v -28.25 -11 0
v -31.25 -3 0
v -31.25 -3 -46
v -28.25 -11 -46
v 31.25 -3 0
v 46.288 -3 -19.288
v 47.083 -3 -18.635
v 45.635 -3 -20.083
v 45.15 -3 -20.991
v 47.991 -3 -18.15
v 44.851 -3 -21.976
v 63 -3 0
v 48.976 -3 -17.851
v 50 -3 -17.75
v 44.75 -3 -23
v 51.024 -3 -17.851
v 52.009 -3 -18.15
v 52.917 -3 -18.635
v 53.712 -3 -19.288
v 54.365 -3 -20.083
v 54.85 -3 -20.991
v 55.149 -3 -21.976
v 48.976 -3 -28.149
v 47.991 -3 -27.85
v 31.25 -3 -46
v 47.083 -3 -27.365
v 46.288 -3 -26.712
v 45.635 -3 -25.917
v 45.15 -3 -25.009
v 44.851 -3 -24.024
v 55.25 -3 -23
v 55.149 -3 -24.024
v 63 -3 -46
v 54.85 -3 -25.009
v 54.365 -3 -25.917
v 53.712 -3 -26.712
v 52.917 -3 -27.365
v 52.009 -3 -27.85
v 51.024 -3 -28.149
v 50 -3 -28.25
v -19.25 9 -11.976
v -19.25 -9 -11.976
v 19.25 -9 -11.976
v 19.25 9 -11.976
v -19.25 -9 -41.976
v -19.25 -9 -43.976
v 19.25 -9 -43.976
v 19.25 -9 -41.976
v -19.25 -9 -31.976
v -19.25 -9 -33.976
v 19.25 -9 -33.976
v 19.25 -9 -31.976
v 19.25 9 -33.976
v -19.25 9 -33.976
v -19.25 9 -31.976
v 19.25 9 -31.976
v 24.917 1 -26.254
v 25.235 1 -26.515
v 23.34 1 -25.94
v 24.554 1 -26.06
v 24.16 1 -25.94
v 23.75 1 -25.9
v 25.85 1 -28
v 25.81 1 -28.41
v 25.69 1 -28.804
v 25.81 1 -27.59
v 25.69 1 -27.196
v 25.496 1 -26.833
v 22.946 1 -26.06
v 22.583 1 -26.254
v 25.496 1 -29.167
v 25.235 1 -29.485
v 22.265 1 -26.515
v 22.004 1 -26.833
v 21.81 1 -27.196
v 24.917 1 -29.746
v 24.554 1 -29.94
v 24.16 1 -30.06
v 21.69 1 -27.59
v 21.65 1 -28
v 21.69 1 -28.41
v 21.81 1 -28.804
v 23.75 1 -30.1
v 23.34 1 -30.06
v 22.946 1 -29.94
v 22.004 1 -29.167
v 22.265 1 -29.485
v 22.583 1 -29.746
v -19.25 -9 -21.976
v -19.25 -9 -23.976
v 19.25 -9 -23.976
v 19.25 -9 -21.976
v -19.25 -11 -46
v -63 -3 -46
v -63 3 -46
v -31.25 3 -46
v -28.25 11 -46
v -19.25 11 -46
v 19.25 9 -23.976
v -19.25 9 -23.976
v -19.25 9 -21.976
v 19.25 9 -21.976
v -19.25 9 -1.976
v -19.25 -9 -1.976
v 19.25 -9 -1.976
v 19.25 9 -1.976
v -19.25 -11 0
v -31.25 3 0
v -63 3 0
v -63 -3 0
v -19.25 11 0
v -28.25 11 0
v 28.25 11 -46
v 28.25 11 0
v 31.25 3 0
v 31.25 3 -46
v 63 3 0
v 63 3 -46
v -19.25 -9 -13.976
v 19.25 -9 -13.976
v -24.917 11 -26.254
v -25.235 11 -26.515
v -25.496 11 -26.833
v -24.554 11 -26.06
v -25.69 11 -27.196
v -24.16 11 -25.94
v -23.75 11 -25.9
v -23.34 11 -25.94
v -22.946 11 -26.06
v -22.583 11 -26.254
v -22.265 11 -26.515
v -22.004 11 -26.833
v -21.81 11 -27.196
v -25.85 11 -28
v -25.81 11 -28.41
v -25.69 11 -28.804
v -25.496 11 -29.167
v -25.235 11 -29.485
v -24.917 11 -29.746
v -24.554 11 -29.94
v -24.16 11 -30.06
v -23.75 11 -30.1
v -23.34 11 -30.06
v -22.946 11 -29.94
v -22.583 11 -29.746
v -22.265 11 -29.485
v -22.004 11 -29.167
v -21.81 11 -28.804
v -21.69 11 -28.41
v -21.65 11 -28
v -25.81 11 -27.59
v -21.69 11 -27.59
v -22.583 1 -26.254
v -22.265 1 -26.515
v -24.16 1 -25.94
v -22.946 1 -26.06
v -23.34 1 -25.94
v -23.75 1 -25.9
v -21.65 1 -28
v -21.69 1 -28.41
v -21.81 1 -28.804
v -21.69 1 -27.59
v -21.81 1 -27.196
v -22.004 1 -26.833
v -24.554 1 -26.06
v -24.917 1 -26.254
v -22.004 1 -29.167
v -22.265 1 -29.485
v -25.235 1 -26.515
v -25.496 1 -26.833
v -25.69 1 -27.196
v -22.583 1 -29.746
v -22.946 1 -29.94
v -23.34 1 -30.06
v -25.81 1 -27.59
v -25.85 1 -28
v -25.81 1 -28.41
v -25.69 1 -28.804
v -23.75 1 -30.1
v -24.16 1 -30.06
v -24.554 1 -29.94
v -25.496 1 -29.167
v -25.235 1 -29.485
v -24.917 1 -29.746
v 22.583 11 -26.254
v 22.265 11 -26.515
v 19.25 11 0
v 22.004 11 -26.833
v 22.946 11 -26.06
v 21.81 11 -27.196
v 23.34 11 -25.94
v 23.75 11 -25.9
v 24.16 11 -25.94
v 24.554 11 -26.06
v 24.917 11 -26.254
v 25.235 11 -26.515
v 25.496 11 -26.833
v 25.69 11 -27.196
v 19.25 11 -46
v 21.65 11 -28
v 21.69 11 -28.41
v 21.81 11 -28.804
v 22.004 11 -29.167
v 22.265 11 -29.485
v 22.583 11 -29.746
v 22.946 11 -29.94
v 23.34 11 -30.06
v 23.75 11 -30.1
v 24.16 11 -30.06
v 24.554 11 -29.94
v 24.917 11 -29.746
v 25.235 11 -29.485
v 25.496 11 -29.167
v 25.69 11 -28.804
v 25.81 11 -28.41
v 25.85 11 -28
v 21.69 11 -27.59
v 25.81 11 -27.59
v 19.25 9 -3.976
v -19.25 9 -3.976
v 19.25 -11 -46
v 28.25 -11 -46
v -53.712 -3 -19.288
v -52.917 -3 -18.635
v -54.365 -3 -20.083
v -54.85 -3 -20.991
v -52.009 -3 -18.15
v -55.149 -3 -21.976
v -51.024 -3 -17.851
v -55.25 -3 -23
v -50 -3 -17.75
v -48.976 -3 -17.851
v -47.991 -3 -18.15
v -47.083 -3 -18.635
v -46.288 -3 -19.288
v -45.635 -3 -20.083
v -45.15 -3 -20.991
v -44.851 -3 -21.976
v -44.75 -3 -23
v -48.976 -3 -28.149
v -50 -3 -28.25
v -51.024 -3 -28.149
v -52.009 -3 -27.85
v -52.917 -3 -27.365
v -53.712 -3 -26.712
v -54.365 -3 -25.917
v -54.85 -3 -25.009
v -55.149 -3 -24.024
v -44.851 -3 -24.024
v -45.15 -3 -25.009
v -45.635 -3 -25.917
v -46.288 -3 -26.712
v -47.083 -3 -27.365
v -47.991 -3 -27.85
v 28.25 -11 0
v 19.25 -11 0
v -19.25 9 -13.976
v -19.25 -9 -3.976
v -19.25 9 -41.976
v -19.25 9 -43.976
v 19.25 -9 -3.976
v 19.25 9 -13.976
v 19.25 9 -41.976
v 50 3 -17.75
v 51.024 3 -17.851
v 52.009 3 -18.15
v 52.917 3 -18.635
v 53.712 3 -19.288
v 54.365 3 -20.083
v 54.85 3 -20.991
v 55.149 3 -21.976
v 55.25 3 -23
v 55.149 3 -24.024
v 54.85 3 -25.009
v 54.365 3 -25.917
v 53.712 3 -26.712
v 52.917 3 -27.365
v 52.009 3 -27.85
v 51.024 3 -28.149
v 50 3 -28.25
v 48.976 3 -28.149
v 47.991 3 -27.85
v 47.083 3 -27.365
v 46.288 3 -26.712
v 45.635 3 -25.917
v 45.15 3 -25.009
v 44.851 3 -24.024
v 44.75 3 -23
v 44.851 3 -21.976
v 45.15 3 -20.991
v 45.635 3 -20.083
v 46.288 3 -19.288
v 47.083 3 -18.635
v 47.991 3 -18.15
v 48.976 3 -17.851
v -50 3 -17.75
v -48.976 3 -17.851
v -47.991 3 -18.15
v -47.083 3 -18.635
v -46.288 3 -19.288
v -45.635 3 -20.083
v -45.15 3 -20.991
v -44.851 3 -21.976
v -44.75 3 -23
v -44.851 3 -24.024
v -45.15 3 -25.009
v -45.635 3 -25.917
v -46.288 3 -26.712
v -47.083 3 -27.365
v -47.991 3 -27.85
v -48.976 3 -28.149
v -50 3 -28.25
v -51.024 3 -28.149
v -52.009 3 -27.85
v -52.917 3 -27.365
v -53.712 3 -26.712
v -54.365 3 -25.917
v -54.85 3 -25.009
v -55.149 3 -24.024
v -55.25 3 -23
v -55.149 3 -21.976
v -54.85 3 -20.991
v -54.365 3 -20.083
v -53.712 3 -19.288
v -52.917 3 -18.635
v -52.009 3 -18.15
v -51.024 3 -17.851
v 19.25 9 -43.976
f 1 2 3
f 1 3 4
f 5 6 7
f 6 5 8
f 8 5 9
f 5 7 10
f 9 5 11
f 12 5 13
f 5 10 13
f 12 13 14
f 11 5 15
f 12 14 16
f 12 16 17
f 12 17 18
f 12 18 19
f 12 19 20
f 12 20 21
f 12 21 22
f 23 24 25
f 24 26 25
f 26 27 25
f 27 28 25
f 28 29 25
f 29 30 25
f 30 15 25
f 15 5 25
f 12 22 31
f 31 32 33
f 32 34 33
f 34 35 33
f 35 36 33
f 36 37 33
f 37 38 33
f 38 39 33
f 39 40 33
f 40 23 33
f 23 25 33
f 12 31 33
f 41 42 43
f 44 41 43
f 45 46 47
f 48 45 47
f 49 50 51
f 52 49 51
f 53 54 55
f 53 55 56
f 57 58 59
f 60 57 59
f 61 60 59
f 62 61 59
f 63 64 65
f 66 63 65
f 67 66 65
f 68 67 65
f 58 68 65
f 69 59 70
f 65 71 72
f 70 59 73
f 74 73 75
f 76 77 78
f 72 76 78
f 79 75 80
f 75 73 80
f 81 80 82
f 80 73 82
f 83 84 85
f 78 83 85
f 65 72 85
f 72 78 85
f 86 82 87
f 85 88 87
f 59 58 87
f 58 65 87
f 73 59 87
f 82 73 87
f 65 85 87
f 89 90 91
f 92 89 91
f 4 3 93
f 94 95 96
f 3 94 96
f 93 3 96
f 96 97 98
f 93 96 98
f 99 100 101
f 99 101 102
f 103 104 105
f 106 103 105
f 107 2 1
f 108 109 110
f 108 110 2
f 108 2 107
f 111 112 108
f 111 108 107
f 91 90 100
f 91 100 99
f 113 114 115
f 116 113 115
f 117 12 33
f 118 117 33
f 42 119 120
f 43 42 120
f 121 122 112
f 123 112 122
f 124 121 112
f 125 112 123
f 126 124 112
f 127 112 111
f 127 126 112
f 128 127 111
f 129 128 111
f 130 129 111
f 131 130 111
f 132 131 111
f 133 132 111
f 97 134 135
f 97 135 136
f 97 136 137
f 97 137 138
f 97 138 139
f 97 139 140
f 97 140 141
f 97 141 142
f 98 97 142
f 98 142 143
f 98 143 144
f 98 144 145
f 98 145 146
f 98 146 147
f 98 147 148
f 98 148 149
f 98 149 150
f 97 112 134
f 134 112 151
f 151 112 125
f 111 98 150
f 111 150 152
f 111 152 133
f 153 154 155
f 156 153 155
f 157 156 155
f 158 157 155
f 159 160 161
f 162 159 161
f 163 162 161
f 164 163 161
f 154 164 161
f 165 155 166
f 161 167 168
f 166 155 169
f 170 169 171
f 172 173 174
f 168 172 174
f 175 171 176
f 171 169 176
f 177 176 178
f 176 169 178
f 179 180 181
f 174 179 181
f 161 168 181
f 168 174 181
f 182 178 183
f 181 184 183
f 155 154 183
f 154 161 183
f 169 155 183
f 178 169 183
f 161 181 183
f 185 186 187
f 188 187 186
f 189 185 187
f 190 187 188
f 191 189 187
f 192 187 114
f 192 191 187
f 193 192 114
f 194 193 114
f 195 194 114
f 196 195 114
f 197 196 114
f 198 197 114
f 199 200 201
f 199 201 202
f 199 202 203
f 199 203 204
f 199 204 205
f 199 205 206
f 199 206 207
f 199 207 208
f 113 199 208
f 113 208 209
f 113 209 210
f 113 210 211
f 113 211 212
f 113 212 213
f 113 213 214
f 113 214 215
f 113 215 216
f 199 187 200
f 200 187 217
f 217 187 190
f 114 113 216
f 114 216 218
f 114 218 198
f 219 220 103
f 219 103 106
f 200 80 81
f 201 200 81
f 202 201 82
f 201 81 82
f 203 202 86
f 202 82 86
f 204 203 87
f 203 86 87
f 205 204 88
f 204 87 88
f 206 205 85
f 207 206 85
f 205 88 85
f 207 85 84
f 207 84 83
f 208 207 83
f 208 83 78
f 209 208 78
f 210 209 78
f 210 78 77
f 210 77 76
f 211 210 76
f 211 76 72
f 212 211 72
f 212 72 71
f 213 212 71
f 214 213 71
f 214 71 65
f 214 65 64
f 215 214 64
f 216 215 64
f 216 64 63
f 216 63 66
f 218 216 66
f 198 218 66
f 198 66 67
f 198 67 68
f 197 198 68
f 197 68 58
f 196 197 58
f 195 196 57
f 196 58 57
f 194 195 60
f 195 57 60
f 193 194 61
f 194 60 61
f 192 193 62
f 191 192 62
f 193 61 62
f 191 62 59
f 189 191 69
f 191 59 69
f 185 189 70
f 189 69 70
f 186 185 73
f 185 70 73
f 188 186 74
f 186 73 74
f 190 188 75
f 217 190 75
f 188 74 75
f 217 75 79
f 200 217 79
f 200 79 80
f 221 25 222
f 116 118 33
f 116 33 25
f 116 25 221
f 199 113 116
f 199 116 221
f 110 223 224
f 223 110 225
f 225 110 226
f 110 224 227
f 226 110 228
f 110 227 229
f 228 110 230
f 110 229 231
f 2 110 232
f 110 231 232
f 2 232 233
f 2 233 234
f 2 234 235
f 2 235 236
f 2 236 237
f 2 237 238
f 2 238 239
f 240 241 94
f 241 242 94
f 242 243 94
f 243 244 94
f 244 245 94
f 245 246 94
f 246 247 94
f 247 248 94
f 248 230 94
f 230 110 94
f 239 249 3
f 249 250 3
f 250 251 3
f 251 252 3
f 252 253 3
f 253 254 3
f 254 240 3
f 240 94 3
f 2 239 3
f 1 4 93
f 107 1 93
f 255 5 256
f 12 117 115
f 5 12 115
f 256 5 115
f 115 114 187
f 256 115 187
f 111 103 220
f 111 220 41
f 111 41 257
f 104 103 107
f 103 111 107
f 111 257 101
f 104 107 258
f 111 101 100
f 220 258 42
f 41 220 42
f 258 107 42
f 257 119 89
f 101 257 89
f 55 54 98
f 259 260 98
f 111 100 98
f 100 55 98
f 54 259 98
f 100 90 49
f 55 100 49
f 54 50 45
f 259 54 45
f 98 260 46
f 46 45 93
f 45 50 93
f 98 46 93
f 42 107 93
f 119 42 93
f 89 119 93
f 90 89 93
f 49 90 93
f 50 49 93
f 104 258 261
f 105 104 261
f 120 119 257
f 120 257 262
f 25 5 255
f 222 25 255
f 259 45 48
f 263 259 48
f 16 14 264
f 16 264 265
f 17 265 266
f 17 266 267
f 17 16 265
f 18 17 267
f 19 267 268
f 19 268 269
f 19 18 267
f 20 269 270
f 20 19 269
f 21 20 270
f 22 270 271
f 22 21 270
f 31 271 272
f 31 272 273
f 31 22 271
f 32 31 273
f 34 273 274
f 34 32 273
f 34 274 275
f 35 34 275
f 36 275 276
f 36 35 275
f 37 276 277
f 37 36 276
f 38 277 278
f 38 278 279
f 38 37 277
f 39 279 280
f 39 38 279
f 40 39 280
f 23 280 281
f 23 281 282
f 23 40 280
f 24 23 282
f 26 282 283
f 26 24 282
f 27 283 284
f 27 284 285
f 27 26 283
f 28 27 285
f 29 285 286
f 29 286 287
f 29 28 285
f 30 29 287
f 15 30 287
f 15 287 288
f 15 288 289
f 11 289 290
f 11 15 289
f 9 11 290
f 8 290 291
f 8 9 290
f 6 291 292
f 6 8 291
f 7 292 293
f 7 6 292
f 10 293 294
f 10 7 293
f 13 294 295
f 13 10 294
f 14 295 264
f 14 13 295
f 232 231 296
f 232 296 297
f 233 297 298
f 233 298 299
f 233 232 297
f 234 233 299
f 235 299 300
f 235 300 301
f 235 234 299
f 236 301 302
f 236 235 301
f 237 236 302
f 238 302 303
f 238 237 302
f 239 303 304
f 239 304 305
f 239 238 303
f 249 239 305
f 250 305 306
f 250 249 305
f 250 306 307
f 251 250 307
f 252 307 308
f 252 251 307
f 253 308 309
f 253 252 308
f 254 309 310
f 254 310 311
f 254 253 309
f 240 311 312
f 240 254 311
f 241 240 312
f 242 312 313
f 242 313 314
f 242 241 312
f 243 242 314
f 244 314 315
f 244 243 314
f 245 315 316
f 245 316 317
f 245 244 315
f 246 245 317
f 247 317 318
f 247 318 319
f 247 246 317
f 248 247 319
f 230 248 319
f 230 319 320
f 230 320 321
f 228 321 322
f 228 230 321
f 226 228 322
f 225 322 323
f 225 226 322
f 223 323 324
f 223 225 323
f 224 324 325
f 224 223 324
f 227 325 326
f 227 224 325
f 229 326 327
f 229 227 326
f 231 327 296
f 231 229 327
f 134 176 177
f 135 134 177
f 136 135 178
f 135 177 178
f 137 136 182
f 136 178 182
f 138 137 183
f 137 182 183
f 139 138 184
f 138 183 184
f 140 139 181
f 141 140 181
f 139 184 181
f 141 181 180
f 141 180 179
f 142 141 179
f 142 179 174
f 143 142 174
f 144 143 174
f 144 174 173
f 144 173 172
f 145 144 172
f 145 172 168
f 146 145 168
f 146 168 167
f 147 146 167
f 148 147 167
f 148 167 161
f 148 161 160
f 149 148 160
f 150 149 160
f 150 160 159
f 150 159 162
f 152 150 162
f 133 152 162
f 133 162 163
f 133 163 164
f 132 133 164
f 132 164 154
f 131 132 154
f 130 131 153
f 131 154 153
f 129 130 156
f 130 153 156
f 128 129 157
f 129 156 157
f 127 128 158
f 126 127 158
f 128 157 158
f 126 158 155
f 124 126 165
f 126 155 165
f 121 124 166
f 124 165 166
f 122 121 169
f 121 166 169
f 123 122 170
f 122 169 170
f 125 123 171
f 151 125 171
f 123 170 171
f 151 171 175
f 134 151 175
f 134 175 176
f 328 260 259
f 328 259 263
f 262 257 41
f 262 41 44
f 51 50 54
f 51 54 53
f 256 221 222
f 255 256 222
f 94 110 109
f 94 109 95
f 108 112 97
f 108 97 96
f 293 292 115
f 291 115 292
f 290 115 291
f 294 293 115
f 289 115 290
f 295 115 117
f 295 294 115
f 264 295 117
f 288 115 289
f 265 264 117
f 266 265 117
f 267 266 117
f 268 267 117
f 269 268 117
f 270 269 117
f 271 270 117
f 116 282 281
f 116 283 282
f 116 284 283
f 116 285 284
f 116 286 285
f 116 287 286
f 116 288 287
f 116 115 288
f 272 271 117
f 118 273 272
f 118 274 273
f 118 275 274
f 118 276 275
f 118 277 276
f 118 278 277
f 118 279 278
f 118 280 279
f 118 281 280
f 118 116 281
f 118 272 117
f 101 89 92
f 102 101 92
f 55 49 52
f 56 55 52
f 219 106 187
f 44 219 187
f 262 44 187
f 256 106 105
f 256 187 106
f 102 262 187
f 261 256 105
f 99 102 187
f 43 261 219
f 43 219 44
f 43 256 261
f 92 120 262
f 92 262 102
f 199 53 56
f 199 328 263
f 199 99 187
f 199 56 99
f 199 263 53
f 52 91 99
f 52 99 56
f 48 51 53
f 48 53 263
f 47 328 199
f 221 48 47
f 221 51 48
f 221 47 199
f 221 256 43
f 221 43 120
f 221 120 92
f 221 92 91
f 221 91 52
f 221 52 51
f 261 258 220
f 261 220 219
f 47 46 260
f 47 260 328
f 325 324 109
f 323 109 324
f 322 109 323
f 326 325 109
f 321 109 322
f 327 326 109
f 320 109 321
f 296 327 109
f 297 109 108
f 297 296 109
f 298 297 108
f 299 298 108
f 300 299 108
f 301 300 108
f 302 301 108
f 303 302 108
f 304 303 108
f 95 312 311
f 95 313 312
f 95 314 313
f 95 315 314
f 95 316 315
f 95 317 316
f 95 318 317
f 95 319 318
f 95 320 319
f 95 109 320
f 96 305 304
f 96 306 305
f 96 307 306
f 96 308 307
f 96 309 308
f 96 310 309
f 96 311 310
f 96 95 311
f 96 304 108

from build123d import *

# Parameters (mm, degrees)
BOSS_EXTRUDE1_DEPTH        = 3
BOSS_EXTRUDE1_DEPTH_BACK   = 3
SKETCH1_W                  = 31.75
SKETCH1_H                  = 46
SKETCH1_R                  = 5.25
BOSS_EXTRUDE1_2_DEPTH      = 3
BOSS_EXTRUDE1_2_DEPTH_BACK = 3
BOSS_EXTRUDE2_DEPTH        = 11
BOSS_EXTRUDE2_DEPTH_BACK   = 11
SKETCH2_W                  = 9
SKETCH2_H                  = 46
BOSS_EXTRUDE2_2_DEPTH      = 11
BOSS_EXTRUDE2_2_DEPTH_BACK = 11
BOSS_EXTRUDE3_DEPTH        = 46
M5X0_8_TAPPED_HOLE1_D      = 4.2
M5X0_8_TAPPED_HOLE1_DEPTH  = 10
BOSS_EXTRUDE4_DEPTH        = 9
BOSS_EXTRUDE4_DEPTH_BACK   = 9
SKETCH6_W                  = 38.5
SKETCH6_H                  = 2


with BuildPart() as part:
    # Sketch1 → Boss-Extrude1 (new, two sides: drawn at the far end of the back side and taken through both)
    with BuildSketch(Plane(origin=(0, 0, 0), x_dir=(1, 0, 0), z_dir=(0, 1, 0)).offset(-BOSS_EXTRUDE1_DEPTH_BACK)):
        with Locations((-47.125, 23)):
            Rectangle(SKETCH1_W, SKETCH1_H)
        with Locations(Location((-50, 23, 0), (0, 0, 270))):
            Circle(SKETCH1_R, mode=Mode.SUBTRACT)
    extrude(amount=BOSS_EXTRUDE1_DEPTH + BOSS_EXTRUDE1_DEPTH_BACK)



with BuildPart() as body_2:
    # Sketch1 → Boss-Extrude1 2 (new, two sides: drawn at the far end of the back side and taken through both)
    with BuildSketch(Plane(origin=(0, 0, 0), x_dir=(1, 0, 0), z_dir=(0, 1, 0)).offset(-BOSS_EXTRUDE1_2_DEPTH_BACK)):
        with Locations((47.125, 23)):
            Rectangle(SKETCH1_W, SKETCH1_H)
        with Locations(Location((50, 23, 0), (0, 0, 270))):
            Circle(SKETCH1_R, mode=Mode.SUBTRACT)
    extrude(amount=BOSS_EXTRUDE1_2_DEPTH + BOSS_EXTRUDE1_2_DEPTH_BACK)


with BuildPart() as body_3:
    # Sketch2 → Boss-Extrude2 (new, two sides: drawn at the far end of the back side and taken through both)
    with BuildSketch(Plane(origin=(0, 0, 0), x_dir=(1, 0, 0), z_dir=(0, 1, 0)).offset(-BOSS_EXTRUDE2_DEPTH_BACK)):
        with Locations((23.75, 23)):
            Rectangle(SKETCH2_W, SKETCH2_H)
    extrude(amount=BOSS_EXTRUDE2_DEPTH + BOSS_EXTRUDE2_DEPTH_BACK)


with BuildPart() as body_4:
    # Sketch2 → Boss-Extrude2 2 (new, two sides: drawn at the far end of the back side and taken through both)
    with BuildSketch(Plane(origin=(0, 0, 0), x_dir=(1, 0, 0), z_dir=(0, 1, 0)).offset(-BOSS_EXTRUDE2_2_DEPTH_BACK)):
        with Locations((-23.75, 23)):
            Rectangle(SKETCH2_W, SKETCH2_H)
    extrude(amount=BOSS_EXTRUDE2_2_DEPTH + BOSS_EXTRUDE2_2_DEPTH_BACK)


with BuildPart() as part_1:
    add(part.part)

    add(body_2.part)  # Boss-Extrude3 merges body 2

    add(body_3.part)  # Boss-Extrude3 merges body 3

    add(body_4.part)  # Boss-Extrude3 merges body 4
    # Sketch3 → Boss-Extrude3 (add, through all)
    with BuildSketch(Plane.XY):
        Polygon((28.25, 11), (31.25, 3), (31.25, -3), (28.25, -11), align=None)
        Polygon((-31.25, 3), (-31.25, -3), (-28.25, -11), (-28.25, 11), align=None)
    extrude(amount=-BOSS_EXTRUDE3_DEPTH)

    # M5x0.8 Tapped Hole1
    with Locations(Plane(origin=(0, 11, 0), x_dir=(1, 0, 0), z_dir=(0, 1, 0))):
        with Locations((-23.75, 28), (23.75, 28)):
            Hole(M5X0_8_TAPPED_HOLE1_D / 2, depth=M5X0_8_TAPPED_HOLE1_DEPTH)

    # Sketch6 → Boss-Extrude4 (add, two sides: drawn at the far end of the back side and taken through both)
    with BuildSketch(Plane(origin=(0, 0, 0), x_dir=(1, 0, 0), z_dir=(0, 1, 0)).offset(-BOSS_EXTRUDE4_DEPTH_BACK)):
        with Locations((0, 2.975890667)):
            Rectangle(SKETCH6_W, SKETCH6_H)
        with Locations((0, 12.975890667)):
            Rectangle(SKETCH6_W, SKETCH6_H)
        with Locations((0, 22.975890667)):
            Rectangle(SKETCH6_W, SKETCH6_H)
        with Locations((0, 32.975890667)):
            Rectangle(SKETCH6_W, SKETCH6_H)
        with Locations((0, 42.975890667)):
            Rectangle(SKETCH6_W, SKETCH6_H)
    extrude(amount=BOSS_EXTRUDE4_DEPTH + BOSS_EXTRUDE4_DEPTH_BACK)


solid = part_1.part
